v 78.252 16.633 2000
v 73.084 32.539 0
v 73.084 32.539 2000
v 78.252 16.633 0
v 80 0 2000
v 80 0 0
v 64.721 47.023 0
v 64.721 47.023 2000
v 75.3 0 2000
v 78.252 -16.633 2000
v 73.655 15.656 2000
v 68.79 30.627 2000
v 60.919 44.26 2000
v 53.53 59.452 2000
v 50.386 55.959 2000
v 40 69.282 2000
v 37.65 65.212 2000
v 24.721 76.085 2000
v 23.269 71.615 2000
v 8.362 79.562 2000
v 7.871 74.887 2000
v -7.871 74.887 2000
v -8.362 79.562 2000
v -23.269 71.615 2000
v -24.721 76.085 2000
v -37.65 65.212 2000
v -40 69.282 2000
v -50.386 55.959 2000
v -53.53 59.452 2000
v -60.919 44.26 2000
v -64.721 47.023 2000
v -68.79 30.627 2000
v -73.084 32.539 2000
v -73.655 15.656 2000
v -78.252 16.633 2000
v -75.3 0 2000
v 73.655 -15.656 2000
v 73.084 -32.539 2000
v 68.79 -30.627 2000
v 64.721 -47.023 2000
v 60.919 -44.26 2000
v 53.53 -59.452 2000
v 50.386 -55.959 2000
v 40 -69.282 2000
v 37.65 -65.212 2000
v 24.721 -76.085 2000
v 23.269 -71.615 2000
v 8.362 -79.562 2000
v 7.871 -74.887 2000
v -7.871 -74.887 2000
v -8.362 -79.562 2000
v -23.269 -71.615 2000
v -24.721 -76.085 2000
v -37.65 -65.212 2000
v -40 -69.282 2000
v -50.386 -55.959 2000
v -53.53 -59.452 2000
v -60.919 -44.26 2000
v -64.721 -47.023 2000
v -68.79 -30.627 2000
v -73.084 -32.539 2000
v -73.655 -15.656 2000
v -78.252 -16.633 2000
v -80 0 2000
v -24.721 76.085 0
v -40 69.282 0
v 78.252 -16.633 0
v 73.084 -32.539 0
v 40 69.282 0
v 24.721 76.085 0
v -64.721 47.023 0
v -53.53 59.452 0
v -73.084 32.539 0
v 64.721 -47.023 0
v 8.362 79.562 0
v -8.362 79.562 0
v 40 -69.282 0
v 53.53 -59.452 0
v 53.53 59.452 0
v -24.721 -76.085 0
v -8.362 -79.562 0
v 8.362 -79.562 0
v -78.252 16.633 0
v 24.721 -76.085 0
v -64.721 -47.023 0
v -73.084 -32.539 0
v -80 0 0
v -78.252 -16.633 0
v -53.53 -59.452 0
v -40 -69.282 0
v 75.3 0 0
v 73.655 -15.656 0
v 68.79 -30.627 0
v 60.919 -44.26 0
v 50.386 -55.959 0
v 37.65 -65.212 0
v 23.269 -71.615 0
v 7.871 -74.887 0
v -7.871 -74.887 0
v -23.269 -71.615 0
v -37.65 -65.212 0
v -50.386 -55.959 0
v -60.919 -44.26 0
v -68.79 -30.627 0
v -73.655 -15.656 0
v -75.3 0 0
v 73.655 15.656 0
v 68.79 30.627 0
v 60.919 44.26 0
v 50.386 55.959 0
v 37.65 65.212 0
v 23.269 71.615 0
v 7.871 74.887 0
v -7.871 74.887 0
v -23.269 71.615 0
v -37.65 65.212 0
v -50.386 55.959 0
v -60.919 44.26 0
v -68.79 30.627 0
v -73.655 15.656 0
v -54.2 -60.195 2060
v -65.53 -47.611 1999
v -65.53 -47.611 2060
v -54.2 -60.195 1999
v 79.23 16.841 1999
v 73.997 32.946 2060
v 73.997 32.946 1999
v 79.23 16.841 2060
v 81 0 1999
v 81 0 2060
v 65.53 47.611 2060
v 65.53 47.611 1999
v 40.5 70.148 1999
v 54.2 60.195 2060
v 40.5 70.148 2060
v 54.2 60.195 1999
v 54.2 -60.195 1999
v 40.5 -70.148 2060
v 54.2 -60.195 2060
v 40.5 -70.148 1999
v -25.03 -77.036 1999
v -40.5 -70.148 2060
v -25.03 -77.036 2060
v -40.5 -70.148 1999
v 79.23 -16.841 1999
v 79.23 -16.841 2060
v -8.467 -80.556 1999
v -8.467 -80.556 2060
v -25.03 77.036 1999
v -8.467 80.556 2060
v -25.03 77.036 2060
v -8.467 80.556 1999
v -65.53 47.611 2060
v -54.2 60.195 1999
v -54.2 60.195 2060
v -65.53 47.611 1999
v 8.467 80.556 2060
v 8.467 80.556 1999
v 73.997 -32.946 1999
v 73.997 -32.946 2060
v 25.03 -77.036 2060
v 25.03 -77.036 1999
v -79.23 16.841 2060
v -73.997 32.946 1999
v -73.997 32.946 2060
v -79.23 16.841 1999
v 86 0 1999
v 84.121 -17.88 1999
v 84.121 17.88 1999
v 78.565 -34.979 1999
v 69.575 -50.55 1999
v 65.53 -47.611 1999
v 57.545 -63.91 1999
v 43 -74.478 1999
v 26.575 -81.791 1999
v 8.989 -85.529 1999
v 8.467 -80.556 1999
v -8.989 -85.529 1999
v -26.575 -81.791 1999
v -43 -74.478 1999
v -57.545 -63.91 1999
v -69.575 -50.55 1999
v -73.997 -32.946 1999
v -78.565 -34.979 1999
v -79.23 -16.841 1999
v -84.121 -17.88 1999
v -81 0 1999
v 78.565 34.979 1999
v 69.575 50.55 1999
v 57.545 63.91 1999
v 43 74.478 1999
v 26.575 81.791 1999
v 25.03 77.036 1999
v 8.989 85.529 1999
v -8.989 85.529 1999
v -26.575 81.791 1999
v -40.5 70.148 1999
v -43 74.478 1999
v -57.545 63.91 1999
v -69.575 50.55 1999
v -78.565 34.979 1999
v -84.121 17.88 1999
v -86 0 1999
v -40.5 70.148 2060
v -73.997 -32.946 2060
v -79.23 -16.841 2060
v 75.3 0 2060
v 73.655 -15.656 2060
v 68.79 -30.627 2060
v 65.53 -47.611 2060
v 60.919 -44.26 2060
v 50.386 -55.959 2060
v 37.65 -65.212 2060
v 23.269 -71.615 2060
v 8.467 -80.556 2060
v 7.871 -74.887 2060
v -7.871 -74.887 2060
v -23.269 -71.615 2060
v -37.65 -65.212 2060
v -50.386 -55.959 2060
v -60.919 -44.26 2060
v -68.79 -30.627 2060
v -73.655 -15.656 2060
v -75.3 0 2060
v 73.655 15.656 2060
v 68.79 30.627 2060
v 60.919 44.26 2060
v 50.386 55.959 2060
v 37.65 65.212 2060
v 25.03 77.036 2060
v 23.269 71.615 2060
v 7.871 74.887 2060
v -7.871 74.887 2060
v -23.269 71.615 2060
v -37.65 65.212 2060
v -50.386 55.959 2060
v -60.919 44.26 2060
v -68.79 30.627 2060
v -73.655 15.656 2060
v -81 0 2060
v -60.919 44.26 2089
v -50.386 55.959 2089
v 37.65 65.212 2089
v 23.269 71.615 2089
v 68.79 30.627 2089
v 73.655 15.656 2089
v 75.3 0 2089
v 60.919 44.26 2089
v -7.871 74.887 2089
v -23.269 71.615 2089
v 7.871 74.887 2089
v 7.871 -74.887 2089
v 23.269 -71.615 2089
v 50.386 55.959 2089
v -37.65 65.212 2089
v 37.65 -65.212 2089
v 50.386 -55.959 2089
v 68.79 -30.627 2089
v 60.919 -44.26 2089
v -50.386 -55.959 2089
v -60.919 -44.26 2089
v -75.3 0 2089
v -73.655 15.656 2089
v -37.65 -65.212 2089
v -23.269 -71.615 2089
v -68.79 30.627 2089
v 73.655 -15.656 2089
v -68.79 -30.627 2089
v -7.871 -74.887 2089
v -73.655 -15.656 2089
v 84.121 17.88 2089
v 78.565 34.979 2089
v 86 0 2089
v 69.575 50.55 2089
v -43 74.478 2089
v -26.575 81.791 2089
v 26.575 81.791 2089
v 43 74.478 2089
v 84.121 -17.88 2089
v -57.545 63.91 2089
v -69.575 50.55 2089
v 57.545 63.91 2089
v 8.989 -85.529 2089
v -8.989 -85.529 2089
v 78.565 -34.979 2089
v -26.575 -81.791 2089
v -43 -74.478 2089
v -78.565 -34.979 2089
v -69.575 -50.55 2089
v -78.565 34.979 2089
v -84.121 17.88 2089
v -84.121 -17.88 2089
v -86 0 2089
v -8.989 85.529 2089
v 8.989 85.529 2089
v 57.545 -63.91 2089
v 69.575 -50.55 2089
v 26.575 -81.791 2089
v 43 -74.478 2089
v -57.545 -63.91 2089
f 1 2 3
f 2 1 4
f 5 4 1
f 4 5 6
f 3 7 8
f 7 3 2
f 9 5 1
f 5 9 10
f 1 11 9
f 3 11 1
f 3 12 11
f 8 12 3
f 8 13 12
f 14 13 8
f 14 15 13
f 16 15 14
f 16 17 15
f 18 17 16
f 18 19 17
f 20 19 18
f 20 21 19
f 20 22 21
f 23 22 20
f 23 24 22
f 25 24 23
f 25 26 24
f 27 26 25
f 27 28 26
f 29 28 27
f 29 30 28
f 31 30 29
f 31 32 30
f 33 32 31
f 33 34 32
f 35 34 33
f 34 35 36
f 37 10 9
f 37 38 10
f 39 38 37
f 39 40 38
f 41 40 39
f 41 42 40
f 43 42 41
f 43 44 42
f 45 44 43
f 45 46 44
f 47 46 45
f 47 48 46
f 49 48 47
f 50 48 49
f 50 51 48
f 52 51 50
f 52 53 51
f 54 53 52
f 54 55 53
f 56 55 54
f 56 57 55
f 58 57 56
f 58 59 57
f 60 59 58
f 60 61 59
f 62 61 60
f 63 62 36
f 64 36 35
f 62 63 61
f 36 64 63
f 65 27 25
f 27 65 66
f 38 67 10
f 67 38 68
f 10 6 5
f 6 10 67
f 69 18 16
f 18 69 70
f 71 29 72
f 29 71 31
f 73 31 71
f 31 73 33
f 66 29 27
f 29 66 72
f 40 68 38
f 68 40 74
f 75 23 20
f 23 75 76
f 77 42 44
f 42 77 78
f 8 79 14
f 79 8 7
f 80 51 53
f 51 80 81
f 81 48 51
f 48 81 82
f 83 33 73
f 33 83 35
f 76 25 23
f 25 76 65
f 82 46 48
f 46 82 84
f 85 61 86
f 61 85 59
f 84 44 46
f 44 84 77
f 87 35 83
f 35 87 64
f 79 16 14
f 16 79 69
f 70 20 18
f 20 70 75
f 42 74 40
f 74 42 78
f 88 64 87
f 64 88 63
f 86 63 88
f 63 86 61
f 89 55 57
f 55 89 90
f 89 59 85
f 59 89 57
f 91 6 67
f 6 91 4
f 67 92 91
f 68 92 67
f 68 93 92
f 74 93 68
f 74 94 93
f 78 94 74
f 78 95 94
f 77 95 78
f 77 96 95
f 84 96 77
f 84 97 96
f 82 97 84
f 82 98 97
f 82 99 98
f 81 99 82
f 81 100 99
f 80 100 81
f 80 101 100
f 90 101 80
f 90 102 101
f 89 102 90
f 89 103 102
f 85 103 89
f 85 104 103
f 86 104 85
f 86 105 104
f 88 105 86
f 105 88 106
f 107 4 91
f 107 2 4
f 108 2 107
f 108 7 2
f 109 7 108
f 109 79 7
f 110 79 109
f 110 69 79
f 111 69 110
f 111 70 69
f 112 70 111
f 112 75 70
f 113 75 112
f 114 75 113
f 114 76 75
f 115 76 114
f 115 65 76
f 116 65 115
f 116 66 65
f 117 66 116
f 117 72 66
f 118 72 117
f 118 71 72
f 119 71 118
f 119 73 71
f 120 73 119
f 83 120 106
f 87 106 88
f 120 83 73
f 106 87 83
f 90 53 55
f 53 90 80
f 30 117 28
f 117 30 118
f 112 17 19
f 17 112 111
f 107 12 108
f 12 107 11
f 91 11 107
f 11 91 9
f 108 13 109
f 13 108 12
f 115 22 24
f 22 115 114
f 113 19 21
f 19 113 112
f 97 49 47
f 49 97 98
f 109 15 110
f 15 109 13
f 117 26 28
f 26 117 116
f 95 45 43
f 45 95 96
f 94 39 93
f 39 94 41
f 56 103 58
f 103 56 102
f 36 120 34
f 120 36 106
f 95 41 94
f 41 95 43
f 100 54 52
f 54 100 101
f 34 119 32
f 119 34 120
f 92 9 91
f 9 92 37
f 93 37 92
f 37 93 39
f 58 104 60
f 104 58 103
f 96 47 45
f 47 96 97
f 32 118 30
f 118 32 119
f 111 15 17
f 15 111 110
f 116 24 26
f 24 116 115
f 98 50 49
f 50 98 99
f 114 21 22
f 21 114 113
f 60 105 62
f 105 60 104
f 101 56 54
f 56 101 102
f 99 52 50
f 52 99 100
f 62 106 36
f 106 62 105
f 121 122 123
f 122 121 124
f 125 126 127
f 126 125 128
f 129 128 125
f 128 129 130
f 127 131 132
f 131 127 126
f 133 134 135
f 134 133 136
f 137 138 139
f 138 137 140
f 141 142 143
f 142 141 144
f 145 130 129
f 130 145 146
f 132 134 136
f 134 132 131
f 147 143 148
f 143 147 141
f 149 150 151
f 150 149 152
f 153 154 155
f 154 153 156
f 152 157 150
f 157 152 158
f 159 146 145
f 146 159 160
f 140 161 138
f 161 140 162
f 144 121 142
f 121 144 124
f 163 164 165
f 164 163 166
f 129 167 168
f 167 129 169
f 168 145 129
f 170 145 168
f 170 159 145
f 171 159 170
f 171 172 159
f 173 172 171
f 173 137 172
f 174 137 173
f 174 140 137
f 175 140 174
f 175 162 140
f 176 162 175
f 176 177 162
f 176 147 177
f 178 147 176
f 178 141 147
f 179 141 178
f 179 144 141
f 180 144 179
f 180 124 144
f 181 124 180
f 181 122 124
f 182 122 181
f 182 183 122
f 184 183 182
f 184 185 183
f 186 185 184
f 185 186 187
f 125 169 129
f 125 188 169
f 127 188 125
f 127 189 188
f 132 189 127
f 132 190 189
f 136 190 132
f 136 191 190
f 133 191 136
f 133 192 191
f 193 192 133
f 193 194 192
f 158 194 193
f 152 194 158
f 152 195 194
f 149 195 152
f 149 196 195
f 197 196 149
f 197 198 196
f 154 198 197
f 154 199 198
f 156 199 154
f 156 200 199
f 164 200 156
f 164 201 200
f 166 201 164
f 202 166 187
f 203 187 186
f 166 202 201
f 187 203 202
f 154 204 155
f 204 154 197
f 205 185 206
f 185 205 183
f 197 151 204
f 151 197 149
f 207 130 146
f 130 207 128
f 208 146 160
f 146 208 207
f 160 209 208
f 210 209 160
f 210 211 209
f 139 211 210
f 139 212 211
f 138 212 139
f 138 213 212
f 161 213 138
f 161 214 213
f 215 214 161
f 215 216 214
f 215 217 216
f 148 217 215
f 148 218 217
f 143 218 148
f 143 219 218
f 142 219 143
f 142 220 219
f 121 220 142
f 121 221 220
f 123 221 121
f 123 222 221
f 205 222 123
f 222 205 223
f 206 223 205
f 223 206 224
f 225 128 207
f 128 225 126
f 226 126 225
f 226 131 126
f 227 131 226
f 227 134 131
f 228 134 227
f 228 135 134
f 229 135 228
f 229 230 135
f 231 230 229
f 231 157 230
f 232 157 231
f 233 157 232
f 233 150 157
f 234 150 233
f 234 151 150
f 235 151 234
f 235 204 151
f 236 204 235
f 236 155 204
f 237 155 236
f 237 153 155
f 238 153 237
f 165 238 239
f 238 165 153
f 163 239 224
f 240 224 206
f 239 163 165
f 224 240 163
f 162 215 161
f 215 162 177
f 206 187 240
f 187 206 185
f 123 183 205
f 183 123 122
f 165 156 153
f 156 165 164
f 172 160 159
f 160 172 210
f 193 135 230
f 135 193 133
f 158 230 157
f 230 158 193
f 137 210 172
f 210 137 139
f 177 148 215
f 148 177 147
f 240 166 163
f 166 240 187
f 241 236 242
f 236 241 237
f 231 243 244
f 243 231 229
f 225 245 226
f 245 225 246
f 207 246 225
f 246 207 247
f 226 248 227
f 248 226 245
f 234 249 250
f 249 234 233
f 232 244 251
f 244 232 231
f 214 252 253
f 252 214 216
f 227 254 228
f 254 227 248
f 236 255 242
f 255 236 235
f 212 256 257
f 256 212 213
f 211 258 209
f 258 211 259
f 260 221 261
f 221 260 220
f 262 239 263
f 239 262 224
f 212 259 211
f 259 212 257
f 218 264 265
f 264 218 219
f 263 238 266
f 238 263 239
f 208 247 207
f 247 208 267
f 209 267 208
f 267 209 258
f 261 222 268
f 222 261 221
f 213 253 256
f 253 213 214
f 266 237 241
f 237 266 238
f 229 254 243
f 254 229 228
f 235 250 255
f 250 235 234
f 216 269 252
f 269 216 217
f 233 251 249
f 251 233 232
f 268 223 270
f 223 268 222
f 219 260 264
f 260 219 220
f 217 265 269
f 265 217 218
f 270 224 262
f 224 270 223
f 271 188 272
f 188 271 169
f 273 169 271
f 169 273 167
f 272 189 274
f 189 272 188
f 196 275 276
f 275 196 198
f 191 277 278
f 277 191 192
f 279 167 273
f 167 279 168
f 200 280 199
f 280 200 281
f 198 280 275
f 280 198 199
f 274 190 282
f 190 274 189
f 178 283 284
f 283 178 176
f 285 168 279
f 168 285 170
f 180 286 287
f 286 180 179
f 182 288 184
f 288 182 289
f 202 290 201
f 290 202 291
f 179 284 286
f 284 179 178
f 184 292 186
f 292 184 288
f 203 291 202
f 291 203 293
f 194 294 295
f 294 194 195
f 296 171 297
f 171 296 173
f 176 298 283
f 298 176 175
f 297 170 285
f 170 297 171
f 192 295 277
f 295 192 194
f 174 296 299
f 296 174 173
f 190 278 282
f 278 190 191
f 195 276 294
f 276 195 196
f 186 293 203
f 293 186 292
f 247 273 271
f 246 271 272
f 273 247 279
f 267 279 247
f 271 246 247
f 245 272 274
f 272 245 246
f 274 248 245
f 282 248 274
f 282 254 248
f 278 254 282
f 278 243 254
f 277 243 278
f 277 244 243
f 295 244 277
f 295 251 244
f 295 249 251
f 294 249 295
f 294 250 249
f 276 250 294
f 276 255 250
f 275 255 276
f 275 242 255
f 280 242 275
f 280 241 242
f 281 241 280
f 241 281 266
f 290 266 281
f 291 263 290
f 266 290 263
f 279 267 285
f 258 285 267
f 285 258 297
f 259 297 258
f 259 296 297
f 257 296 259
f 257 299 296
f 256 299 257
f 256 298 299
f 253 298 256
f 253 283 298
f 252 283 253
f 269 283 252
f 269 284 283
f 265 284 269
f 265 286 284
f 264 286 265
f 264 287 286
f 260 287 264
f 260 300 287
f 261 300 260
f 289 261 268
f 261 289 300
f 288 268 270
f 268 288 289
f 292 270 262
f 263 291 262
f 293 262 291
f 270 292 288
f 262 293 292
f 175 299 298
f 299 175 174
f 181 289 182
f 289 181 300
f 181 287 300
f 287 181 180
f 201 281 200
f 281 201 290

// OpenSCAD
// Parameters
pipe_standard = 1; //[1:1:1]
nominal_diameter_mm = 160; //[80:320:1]
length_mm = 2000; //[500:4000:10]
include_end_fitting = 1; //[0:1:1]
od_mm = 160; //[80:320:1]
wall_thickness_mm = 4.7; //[2.5:9.5:0.1]
overlap_mm = 1; //[0.5:2:0.1]
fitting_length_mm = 90; //[45:180:1]
fitting_od_extra_mm = 12; //[6:24:0.5]
fitting_wall_extra_mm = 2; //[0.5:5:0.1]
socket_depth_mm = 60; //[30:120:1]
socket_clearance_mm = 1; //[0.2:2:0.1]

// HT Pipe - complete geometry
module ht_pipe() {
  color([0.85, 0.85, 0.8]) {
    // Pipe body
    difference() {
      cylinder(h=length_mm, r=od_mm/2, center=false);
      translate([0, 0, -overlap_mm/2])
        cylinder(h=length_mm + overlap_mm, r=od_mm/2 - wall_thickness_mm, center=false);
    }
    
    // End fitting
    if (include_end_fitting) {
      difference() {
        translate([0, 0, length_mm - overlap_mm])
          cylinder(h=fitting_length_mm, r=od_mm/2 + fitting_od_extra_mm/2, center=false);
        union() {
          translate([0, 0, length_mm - overlap_mm])
            cylinder(h=socket_depth_mm + overlap_mm, r=od_mm/2 + socket_clearance_mm, center=false);
          translate([0, 0, length_mm - overlap_mm/2])
            cylinder(h=fitting_length_mm + overlap_mm, r=od_mm/2 - wall_thickness_mm, center=false);
        }
      }
    }
  }
}

// Assembly
module assembly() {
  ht_pipe();
}

assembly();
